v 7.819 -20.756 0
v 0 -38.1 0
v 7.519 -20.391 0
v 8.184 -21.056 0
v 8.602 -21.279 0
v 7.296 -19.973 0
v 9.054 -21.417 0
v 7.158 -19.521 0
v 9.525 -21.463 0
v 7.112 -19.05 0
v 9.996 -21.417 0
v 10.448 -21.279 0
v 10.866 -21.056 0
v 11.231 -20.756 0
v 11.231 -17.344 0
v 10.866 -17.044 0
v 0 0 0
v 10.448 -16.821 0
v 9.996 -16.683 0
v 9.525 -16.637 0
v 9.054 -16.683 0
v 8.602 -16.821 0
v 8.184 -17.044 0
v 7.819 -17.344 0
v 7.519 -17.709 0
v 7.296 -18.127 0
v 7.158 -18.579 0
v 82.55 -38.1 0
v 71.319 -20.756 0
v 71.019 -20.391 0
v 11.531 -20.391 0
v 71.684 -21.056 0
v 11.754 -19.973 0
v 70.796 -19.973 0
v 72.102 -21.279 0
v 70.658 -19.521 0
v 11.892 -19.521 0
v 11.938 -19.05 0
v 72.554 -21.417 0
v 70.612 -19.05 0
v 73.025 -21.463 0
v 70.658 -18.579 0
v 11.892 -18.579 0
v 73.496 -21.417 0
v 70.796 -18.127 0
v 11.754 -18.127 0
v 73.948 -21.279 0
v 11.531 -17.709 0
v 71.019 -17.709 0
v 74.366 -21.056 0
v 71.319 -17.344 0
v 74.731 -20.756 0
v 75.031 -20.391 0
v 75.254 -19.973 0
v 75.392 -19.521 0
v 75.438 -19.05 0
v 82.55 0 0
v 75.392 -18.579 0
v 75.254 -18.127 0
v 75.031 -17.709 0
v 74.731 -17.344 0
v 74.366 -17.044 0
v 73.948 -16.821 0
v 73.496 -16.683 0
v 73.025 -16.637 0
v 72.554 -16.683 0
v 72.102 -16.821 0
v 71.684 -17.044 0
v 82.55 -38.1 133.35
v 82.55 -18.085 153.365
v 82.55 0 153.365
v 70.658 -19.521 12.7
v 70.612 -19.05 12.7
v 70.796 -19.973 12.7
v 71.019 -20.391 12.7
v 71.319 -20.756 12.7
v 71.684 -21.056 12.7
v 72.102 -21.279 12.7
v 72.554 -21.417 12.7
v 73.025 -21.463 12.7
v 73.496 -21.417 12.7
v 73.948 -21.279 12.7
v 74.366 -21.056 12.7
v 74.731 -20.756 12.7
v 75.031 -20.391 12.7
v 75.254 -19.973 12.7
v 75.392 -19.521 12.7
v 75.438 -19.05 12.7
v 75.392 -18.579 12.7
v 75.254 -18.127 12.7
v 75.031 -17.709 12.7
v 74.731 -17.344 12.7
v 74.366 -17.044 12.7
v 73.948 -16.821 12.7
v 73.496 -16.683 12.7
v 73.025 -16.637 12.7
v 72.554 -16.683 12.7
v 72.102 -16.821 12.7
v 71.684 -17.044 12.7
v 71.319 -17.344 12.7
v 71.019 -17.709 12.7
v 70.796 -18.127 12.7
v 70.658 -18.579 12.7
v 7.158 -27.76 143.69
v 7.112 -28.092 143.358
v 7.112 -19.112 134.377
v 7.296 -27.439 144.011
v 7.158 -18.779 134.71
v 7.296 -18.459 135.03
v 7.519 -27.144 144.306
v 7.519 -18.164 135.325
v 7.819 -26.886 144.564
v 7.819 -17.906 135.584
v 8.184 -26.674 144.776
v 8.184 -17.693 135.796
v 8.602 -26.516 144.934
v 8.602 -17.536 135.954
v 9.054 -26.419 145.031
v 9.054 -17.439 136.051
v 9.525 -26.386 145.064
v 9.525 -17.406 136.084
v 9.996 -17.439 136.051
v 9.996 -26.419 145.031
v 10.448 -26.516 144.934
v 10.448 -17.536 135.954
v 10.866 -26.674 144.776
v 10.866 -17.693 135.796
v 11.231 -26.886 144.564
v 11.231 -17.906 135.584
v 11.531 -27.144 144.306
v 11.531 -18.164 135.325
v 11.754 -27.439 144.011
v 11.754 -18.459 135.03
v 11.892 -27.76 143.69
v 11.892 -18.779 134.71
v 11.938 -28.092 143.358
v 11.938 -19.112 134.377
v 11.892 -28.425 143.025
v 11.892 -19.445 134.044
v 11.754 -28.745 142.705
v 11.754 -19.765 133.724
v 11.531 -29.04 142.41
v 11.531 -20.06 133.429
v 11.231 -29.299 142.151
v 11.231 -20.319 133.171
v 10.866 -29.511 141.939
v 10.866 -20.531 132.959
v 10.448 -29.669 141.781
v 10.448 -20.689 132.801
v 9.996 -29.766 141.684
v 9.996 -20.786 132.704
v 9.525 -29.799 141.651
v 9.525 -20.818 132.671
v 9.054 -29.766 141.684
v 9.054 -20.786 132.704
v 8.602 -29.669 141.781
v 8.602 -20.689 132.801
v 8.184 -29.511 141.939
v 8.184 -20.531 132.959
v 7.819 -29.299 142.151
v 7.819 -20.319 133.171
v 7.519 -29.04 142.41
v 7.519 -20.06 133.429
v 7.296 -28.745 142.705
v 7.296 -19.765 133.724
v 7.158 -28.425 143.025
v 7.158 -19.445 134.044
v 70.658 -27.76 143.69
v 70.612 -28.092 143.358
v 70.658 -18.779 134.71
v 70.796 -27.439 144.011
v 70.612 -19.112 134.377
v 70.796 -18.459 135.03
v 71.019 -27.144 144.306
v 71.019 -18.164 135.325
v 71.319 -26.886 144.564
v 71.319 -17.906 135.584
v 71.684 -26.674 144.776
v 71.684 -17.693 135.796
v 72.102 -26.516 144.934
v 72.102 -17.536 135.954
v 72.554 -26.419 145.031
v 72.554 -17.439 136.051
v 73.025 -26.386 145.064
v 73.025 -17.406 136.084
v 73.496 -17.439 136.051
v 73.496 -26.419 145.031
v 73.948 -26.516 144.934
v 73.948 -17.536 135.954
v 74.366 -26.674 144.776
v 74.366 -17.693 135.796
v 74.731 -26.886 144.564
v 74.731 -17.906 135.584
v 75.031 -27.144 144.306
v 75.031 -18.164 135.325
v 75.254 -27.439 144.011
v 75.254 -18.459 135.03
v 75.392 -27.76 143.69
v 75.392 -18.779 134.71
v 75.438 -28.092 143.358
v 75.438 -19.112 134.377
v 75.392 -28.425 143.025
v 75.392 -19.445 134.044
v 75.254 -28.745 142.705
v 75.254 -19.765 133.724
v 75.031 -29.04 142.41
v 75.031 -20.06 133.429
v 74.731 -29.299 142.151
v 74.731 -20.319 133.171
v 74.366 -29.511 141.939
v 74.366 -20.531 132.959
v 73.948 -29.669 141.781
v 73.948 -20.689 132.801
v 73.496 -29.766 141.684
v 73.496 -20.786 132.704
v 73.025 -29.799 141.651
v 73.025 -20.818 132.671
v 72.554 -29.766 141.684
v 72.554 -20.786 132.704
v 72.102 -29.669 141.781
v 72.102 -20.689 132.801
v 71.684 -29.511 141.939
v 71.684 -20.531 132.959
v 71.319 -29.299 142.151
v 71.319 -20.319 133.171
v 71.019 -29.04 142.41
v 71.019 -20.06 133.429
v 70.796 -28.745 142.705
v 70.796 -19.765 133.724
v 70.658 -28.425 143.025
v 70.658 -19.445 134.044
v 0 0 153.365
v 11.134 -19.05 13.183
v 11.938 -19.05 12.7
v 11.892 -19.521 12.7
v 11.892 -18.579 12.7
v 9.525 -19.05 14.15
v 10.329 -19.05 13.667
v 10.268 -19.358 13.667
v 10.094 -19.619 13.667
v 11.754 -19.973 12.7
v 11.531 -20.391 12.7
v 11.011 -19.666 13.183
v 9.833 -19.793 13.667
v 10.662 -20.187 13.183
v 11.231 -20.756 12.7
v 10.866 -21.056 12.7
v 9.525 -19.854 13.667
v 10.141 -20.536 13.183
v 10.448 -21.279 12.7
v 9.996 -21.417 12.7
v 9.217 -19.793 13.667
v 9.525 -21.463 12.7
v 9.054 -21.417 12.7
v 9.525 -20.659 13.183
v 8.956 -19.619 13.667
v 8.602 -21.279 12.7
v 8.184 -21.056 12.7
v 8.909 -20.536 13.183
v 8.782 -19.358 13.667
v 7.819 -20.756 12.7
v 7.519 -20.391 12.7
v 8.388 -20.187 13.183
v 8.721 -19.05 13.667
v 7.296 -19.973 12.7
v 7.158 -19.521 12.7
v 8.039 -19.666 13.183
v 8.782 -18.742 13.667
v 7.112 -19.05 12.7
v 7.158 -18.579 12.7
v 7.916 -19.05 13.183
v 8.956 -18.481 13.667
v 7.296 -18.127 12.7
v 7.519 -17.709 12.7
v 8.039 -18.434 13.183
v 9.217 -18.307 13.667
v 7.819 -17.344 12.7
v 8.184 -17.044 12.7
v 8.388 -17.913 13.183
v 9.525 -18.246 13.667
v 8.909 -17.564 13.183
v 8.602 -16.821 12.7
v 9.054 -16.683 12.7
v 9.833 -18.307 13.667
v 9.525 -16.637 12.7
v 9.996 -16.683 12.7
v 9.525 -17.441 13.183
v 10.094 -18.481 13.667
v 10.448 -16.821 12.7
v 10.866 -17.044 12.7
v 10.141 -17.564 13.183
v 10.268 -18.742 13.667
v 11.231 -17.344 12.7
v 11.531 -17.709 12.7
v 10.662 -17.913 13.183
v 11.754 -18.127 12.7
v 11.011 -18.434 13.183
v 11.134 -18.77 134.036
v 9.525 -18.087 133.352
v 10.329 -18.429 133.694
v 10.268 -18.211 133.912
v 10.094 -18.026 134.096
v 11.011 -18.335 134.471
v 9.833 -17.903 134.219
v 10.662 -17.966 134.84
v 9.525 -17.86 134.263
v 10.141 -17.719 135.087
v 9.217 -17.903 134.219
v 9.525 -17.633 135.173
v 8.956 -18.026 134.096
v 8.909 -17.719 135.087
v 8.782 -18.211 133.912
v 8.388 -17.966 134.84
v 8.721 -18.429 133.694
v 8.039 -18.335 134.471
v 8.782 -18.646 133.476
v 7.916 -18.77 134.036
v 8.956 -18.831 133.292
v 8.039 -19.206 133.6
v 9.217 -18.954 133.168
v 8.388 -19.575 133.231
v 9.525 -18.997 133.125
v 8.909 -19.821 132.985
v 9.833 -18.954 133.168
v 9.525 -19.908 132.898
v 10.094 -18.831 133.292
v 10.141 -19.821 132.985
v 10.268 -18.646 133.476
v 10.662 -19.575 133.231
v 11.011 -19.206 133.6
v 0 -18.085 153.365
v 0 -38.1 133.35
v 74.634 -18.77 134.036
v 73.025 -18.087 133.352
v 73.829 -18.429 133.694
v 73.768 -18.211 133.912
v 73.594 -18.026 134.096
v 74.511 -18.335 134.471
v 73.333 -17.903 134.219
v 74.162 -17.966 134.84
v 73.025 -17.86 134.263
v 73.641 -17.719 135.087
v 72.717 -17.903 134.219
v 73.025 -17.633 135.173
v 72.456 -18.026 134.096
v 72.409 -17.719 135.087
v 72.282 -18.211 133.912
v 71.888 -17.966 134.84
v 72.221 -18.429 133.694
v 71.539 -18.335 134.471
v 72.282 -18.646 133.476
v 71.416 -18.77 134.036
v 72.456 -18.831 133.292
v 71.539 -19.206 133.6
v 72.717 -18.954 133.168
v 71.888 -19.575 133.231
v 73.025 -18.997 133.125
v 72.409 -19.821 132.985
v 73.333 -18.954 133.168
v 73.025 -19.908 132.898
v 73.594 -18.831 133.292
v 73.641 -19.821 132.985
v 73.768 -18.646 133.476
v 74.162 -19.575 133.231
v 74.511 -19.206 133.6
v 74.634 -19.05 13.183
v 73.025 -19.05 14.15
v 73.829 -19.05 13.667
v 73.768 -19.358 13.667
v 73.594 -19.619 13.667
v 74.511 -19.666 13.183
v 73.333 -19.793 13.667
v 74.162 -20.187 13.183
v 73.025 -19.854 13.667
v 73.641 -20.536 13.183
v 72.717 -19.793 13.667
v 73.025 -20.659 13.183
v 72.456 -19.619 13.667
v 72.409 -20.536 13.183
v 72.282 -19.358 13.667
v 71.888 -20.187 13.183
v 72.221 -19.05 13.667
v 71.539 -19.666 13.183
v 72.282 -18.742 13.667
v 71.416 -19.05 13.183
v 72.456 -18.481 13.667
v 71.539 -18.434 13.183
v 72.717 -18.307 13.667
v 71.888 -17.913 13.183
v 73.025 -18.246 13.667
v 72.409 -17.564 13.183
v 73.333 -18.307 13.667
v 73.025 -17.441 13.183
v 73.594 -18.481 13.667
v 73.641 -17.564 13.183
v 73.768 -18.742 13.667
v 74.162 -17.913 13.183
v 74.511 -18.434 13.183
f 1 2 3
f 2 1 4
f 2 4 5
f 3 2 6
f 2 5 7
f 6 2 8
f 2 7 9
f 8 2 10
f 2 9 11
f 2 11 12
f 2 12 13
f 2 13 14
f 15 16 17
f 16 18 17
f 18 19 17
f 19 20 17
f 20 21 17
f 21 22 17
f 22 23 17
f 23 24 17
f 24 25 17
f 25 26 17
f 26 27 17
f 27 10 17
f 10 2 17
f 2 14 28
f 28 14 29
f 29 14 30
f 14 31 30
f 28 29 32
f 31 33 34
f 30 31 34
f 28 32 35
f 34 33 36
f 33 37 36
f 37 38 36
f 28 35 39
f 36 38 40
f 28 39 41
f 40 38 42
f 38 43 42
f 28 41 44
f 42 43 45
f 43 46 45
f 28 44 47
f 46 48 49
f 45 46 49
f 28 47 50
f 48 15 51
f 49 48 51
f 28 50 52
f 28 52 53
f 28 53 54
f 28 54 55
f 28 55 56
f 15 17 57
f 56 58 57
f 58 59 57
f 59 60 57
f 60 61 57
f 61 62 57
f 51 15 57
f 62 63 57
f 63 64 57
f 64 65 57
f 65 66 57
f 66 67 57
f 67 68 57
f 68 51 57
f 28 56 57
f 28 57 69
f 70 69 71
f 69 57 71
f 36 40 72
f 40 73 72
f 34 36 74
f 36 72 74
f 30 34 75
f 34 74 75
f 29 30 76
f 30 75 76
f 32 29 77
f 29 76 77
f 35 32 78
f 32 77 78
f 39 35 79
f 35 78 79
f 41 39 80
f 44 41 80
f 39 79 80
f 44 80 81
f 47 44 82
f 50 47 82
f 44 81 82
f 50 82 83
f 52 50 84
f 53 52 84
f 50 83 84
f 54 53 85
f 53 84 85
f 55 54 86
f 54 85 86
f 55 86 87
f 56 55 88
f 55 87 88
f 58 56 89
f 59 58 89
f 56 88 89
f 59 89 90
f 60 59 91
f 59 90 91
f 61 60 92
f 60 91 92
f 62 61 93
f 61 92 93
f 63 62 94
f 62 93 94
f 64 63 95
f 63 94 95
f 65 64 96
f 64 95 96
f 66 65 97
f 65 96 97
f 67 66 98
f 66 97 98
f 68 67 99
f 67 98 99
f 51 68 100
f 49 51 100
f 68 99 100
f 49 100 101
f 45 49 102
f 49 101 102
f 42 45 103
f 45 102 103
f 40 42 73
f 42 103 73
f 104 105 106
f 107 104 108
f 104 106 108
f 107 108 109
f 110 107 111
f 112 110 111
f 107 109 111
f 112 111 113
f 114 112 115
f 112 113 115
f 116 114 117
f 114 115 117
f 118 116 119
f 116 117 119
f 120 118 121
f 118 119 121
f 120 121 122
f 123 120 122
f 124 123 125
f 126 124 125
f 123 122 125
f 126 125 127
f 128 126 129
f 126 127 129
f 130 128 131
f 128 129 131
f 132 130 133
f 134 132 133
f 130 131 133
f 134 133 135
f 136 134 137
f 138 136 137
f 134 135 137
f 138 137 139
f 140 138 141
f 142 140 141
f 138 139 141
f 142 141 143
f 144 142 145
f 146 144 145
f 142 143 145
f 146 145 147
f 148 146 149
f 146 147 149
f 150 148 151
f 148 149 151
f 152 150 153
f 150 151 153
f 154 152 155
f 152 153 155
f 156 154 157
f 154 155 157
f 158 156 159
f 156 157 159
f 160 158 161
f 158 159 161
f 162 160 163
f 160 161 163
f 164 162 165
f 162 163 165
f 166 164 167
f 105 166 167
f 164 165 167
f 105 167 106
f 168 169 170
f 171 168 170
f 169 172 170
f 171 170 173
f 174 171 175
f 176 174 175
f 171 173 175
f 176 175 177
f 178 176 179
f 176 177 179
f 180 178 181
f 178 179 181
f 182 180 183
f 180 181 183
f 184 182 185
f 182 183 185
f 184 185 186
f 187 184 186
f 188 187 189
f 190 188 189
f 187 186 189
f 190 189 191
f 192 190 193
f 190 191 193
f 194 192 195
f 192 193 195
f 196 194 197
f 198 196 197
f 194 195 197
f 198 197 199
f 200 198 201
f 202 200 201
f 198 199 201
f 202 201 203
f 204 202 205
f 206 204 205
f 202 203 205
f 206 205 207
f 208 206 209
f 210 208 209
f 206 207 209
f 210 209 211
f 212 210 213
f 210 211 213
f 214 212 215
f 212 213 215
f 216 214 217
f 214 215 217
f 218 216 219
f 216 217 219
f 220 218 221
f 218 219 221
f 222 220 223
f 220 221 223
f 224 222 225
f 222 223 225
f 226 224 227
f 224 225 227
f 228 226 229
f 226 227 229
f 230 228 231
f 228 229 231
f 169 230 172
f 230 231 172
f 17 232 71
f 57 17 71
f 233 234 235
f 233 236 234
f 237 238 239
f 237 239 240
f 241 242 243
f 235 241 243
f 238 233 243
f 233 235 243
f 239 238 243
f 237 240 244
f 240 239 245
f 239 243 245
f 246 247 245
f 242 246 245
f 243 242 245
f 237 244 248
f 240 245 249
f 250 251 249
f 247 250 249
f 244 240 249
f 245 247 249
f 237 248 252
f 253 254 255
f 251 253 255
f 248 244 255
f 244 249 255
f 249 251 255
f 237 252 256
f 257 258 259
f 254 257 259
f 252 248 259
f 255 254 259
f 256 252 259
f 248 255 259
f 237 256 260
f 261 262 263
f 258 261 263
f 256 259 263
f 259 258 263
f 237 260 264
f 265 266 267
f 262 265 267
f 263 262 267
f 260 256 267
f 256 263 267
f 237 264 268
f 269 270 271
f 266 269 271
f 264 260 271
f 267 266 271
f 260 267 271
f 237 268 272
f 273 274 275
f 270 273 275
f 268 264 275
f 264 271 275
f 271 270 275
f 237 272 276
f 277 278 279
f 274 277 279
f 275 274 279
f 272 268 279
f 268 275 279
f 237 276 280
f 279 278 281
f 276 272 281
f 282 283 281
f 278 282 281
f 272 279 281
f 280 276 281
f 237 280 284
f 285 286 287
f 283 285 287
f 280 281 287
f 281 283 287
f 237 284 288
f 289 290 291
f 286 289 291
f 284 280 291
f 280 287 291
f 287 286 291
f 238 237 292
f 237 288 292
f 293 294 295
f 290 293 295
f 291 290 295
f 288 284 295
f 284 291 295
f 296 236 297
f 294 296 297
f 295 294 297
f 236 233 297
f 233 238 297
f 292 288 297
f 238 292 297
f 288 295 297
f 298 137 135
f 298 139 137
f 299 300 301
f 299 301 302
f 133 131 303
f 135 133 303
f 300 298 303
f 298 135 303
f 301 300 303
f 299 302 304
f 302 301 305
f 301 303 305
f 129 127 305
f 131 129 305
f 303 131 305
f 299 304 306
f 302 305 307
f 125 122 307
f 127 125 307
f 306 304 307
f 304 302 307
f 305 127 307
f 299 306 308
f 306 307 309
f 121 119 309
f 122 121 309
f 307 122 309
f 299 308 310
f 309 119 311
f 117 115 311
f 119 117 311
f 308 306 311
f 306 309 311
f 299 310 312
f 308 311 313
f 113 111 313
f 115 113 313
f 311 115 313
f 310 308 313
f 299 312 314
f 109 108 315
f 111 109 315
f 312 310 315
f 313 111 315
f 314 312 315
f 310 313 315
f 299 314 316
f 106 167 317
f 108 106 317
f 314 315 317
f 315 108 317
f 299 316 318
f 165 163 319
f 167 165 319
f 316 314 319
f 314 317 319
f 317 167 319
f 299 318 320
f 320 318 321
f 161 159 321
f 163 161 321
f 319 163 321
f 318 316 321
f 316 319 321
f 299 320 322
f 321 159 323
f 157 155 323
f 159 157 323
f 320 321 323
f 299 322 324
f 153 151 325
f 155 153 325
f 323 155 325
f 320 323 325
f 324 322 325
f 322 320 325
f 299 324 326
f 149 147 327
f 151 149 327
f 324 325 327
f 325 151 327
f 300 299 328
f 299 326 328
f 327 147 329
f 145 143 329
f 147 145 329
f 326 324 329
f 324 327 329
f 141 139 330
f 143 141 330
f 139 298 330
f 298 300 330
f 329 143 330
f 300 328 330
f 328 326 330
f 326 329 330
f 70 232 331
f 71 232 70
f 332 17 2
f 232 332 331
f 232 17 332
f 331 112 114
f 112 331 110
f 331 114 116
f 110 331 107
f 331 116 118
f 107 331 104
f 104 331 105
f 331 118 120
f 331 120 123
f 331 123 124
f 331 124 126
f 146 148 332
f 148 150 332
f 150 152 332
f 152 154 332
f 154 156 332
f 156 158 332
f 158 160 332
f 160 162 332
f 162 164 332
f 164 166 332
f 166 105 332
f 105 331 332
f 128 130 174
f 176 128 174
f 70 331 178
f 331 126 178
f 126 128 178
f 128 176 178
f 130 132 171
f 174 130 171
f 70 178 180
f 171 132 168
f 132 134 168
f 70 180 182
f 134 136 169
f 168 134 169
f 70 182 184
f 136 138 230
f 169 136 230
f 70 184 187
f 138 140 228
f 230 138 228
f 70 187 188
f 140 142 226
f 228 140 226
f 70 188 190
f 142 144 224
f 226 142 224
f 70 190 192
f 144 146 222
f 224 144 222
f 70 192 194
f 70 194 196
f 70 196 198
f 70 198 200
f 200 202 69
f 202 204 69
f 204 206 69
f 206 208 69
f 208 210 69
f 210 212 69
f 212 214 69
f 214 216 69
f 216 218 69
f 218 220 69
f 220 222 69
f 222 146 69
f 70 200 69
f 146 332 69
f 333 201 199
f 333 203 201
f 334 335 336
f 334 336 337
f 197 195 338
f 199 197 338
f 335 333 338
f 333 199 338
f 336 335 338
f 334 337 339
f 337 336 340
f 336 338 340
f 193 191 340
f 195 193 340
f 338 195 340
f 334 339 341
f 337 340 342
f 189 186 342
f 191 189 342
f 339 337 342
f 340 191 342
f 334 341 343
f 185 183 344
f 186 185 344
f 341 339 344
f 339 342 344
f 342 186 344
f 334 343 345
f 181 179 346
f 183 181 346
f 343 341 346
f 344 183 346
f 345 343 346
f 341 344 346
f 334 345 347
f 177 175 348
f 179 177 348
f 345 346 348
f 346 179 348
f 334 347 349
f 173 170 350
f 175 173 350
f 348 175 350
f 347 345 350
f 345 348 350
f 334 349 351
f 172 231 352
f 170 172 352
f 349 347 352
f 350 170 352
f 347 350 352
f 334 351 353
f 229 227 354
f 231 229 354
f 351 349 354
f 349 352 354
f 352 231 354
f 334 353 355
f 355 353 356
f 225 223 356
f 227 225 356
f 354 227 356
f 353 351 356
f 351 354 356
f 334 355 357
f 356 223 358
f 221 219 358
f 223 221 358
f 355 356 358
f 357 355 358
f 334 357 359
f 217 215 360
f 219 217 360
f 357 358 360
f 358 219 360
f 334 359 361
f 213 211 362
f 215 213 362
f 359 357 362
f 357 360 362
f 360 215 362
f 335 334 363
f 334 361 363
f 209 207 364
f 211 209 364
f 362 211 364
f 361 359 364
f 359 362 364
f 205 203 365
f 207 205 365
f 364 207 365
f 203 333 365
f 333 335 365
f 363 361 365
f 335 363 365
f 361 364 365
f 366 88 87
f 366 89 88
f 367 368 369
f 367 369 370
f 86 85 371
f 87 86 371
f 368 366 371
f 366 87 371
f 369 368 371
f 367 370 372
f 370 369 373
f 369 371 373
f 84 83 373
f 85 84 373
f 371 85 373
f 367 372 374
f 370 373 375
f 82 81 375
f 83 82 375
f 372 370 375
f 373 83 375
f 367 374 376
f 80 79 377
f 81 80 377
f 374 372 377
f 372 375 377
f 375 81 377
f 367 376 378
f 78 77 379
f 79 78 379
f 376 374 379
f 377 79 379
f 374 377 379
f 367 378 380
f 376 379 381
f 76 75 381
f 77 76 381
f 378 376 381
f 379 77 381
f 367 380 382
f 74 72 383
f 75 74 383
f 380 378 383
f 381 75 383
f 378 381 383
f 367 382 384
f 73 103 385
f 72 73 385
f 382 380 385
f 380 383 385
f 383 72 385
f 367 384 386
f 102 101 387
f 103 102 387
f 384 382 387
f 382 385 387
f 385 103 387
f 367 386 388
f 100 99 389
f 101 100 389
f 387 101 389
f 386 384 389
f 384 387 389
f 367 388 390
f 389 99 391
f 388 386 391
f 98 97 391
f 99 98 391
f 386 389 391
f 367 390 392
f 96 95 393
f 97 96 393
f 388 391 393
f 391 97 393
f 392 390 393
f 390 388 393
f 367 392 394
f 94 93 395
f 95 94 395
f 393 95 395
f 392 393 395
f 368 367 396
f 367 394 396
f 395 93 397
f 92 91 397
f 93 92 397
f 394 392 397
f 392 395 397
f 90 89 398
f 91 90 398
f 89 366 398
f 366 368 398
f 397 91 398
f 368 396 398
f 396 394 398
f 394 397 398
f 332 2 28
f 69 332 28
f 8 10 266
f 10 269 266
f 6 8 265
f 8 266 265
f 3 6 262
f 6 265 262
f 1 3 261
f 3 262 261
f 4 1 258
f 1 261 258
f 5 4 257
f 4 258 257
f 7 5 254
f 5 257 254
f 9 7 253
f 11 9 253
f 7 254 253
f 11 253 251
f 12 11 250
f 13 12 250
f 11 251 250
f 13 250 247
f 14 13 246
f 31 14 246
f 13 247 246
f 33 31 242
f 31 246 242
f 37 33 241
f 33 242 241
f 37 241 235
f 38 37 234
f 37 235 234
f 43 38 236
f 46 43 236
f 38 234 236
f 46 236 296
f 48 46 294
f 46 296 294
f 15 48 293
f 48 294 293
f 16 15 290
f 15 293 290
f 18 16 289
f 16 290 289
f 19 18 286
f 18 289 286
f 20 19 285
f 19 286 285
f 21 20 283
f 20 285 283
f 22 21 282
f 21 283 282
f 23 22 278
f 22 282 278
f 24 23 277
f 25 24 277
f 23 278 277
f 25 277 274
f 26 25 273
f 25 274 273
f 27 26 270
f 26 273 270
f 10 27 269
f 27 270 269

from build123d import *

# Parameters (mm, degrees)
F0_W           = 82.55
F0_H           = 153.3652
F1_DEPTH       = 38.1
F2_SIZE2       = 20.0152
F2_SIZE        = 20.0152
F5_D           = 4.826
F5_DEPTH       = 12.7
F5_TIP         = 1.4498766737
F5_ON_F4_D     = 4.826
F5_ON_F4_DEPTH = 12.7
F5_ON_F4_TIP   = 1.4498766737


with BuildPart() as f1:
    # F0 (on Front) → F1 (new body)
    with BuildSketch(Plane.XZ):
        with Locations((41.275, 76.6826)):
            Rectangle(F0_W, F0_H)
    extrude(amount=F1_DEPTH)

    # F2
    f2_edges = [f1.edges().sort_by_distance(p)[0] for p in [
        (41.275, -38.1, 153.3652),
    ]]
    chamfer(f2_edges, length=F2_SIZE, length2=F2_SIZE2)

    # F5
    with Locations(Plane(origin=(0, -85.725, 85.725), x_dir=(1, 0, 0), z_dir=(0, -0.7071067812, 0.7071067812))):
        with Locations((9.525, 81.5048045548), (73.025, 81.5048045548)):
            Hole(F5_D / 2, depth=F5_DEPTH)
            with Locations((0, 0, -(F5_DEPTH + F5_TIP / 2))):  # 118° drill point
                Cone(0, F5_D / 2, F5_TIP, mode=Mode.SUBTRACT)

    # F5 on F4
    with Locations(Plane(origin=(0, 0, 0), x_dir=(1, 0, 0), z_dir=(0, 0, -1))):
        with Locations((9.525, 19.05), (73.025, 19.05)):
            Hole(F5_ON_F4_D / 2, depth=F5_ON_F4_DEPTH)
            with Locations((0, 0, -(F5_ON_F4_DEPTH + F5_ON_F4_TIP / 2))):  # 118° drill point
                Cone(0, F5_ON_F4_D / 2, F5_ON_F4_TIP, mode=Mode.SUBTRACT)


solid = f1.part
